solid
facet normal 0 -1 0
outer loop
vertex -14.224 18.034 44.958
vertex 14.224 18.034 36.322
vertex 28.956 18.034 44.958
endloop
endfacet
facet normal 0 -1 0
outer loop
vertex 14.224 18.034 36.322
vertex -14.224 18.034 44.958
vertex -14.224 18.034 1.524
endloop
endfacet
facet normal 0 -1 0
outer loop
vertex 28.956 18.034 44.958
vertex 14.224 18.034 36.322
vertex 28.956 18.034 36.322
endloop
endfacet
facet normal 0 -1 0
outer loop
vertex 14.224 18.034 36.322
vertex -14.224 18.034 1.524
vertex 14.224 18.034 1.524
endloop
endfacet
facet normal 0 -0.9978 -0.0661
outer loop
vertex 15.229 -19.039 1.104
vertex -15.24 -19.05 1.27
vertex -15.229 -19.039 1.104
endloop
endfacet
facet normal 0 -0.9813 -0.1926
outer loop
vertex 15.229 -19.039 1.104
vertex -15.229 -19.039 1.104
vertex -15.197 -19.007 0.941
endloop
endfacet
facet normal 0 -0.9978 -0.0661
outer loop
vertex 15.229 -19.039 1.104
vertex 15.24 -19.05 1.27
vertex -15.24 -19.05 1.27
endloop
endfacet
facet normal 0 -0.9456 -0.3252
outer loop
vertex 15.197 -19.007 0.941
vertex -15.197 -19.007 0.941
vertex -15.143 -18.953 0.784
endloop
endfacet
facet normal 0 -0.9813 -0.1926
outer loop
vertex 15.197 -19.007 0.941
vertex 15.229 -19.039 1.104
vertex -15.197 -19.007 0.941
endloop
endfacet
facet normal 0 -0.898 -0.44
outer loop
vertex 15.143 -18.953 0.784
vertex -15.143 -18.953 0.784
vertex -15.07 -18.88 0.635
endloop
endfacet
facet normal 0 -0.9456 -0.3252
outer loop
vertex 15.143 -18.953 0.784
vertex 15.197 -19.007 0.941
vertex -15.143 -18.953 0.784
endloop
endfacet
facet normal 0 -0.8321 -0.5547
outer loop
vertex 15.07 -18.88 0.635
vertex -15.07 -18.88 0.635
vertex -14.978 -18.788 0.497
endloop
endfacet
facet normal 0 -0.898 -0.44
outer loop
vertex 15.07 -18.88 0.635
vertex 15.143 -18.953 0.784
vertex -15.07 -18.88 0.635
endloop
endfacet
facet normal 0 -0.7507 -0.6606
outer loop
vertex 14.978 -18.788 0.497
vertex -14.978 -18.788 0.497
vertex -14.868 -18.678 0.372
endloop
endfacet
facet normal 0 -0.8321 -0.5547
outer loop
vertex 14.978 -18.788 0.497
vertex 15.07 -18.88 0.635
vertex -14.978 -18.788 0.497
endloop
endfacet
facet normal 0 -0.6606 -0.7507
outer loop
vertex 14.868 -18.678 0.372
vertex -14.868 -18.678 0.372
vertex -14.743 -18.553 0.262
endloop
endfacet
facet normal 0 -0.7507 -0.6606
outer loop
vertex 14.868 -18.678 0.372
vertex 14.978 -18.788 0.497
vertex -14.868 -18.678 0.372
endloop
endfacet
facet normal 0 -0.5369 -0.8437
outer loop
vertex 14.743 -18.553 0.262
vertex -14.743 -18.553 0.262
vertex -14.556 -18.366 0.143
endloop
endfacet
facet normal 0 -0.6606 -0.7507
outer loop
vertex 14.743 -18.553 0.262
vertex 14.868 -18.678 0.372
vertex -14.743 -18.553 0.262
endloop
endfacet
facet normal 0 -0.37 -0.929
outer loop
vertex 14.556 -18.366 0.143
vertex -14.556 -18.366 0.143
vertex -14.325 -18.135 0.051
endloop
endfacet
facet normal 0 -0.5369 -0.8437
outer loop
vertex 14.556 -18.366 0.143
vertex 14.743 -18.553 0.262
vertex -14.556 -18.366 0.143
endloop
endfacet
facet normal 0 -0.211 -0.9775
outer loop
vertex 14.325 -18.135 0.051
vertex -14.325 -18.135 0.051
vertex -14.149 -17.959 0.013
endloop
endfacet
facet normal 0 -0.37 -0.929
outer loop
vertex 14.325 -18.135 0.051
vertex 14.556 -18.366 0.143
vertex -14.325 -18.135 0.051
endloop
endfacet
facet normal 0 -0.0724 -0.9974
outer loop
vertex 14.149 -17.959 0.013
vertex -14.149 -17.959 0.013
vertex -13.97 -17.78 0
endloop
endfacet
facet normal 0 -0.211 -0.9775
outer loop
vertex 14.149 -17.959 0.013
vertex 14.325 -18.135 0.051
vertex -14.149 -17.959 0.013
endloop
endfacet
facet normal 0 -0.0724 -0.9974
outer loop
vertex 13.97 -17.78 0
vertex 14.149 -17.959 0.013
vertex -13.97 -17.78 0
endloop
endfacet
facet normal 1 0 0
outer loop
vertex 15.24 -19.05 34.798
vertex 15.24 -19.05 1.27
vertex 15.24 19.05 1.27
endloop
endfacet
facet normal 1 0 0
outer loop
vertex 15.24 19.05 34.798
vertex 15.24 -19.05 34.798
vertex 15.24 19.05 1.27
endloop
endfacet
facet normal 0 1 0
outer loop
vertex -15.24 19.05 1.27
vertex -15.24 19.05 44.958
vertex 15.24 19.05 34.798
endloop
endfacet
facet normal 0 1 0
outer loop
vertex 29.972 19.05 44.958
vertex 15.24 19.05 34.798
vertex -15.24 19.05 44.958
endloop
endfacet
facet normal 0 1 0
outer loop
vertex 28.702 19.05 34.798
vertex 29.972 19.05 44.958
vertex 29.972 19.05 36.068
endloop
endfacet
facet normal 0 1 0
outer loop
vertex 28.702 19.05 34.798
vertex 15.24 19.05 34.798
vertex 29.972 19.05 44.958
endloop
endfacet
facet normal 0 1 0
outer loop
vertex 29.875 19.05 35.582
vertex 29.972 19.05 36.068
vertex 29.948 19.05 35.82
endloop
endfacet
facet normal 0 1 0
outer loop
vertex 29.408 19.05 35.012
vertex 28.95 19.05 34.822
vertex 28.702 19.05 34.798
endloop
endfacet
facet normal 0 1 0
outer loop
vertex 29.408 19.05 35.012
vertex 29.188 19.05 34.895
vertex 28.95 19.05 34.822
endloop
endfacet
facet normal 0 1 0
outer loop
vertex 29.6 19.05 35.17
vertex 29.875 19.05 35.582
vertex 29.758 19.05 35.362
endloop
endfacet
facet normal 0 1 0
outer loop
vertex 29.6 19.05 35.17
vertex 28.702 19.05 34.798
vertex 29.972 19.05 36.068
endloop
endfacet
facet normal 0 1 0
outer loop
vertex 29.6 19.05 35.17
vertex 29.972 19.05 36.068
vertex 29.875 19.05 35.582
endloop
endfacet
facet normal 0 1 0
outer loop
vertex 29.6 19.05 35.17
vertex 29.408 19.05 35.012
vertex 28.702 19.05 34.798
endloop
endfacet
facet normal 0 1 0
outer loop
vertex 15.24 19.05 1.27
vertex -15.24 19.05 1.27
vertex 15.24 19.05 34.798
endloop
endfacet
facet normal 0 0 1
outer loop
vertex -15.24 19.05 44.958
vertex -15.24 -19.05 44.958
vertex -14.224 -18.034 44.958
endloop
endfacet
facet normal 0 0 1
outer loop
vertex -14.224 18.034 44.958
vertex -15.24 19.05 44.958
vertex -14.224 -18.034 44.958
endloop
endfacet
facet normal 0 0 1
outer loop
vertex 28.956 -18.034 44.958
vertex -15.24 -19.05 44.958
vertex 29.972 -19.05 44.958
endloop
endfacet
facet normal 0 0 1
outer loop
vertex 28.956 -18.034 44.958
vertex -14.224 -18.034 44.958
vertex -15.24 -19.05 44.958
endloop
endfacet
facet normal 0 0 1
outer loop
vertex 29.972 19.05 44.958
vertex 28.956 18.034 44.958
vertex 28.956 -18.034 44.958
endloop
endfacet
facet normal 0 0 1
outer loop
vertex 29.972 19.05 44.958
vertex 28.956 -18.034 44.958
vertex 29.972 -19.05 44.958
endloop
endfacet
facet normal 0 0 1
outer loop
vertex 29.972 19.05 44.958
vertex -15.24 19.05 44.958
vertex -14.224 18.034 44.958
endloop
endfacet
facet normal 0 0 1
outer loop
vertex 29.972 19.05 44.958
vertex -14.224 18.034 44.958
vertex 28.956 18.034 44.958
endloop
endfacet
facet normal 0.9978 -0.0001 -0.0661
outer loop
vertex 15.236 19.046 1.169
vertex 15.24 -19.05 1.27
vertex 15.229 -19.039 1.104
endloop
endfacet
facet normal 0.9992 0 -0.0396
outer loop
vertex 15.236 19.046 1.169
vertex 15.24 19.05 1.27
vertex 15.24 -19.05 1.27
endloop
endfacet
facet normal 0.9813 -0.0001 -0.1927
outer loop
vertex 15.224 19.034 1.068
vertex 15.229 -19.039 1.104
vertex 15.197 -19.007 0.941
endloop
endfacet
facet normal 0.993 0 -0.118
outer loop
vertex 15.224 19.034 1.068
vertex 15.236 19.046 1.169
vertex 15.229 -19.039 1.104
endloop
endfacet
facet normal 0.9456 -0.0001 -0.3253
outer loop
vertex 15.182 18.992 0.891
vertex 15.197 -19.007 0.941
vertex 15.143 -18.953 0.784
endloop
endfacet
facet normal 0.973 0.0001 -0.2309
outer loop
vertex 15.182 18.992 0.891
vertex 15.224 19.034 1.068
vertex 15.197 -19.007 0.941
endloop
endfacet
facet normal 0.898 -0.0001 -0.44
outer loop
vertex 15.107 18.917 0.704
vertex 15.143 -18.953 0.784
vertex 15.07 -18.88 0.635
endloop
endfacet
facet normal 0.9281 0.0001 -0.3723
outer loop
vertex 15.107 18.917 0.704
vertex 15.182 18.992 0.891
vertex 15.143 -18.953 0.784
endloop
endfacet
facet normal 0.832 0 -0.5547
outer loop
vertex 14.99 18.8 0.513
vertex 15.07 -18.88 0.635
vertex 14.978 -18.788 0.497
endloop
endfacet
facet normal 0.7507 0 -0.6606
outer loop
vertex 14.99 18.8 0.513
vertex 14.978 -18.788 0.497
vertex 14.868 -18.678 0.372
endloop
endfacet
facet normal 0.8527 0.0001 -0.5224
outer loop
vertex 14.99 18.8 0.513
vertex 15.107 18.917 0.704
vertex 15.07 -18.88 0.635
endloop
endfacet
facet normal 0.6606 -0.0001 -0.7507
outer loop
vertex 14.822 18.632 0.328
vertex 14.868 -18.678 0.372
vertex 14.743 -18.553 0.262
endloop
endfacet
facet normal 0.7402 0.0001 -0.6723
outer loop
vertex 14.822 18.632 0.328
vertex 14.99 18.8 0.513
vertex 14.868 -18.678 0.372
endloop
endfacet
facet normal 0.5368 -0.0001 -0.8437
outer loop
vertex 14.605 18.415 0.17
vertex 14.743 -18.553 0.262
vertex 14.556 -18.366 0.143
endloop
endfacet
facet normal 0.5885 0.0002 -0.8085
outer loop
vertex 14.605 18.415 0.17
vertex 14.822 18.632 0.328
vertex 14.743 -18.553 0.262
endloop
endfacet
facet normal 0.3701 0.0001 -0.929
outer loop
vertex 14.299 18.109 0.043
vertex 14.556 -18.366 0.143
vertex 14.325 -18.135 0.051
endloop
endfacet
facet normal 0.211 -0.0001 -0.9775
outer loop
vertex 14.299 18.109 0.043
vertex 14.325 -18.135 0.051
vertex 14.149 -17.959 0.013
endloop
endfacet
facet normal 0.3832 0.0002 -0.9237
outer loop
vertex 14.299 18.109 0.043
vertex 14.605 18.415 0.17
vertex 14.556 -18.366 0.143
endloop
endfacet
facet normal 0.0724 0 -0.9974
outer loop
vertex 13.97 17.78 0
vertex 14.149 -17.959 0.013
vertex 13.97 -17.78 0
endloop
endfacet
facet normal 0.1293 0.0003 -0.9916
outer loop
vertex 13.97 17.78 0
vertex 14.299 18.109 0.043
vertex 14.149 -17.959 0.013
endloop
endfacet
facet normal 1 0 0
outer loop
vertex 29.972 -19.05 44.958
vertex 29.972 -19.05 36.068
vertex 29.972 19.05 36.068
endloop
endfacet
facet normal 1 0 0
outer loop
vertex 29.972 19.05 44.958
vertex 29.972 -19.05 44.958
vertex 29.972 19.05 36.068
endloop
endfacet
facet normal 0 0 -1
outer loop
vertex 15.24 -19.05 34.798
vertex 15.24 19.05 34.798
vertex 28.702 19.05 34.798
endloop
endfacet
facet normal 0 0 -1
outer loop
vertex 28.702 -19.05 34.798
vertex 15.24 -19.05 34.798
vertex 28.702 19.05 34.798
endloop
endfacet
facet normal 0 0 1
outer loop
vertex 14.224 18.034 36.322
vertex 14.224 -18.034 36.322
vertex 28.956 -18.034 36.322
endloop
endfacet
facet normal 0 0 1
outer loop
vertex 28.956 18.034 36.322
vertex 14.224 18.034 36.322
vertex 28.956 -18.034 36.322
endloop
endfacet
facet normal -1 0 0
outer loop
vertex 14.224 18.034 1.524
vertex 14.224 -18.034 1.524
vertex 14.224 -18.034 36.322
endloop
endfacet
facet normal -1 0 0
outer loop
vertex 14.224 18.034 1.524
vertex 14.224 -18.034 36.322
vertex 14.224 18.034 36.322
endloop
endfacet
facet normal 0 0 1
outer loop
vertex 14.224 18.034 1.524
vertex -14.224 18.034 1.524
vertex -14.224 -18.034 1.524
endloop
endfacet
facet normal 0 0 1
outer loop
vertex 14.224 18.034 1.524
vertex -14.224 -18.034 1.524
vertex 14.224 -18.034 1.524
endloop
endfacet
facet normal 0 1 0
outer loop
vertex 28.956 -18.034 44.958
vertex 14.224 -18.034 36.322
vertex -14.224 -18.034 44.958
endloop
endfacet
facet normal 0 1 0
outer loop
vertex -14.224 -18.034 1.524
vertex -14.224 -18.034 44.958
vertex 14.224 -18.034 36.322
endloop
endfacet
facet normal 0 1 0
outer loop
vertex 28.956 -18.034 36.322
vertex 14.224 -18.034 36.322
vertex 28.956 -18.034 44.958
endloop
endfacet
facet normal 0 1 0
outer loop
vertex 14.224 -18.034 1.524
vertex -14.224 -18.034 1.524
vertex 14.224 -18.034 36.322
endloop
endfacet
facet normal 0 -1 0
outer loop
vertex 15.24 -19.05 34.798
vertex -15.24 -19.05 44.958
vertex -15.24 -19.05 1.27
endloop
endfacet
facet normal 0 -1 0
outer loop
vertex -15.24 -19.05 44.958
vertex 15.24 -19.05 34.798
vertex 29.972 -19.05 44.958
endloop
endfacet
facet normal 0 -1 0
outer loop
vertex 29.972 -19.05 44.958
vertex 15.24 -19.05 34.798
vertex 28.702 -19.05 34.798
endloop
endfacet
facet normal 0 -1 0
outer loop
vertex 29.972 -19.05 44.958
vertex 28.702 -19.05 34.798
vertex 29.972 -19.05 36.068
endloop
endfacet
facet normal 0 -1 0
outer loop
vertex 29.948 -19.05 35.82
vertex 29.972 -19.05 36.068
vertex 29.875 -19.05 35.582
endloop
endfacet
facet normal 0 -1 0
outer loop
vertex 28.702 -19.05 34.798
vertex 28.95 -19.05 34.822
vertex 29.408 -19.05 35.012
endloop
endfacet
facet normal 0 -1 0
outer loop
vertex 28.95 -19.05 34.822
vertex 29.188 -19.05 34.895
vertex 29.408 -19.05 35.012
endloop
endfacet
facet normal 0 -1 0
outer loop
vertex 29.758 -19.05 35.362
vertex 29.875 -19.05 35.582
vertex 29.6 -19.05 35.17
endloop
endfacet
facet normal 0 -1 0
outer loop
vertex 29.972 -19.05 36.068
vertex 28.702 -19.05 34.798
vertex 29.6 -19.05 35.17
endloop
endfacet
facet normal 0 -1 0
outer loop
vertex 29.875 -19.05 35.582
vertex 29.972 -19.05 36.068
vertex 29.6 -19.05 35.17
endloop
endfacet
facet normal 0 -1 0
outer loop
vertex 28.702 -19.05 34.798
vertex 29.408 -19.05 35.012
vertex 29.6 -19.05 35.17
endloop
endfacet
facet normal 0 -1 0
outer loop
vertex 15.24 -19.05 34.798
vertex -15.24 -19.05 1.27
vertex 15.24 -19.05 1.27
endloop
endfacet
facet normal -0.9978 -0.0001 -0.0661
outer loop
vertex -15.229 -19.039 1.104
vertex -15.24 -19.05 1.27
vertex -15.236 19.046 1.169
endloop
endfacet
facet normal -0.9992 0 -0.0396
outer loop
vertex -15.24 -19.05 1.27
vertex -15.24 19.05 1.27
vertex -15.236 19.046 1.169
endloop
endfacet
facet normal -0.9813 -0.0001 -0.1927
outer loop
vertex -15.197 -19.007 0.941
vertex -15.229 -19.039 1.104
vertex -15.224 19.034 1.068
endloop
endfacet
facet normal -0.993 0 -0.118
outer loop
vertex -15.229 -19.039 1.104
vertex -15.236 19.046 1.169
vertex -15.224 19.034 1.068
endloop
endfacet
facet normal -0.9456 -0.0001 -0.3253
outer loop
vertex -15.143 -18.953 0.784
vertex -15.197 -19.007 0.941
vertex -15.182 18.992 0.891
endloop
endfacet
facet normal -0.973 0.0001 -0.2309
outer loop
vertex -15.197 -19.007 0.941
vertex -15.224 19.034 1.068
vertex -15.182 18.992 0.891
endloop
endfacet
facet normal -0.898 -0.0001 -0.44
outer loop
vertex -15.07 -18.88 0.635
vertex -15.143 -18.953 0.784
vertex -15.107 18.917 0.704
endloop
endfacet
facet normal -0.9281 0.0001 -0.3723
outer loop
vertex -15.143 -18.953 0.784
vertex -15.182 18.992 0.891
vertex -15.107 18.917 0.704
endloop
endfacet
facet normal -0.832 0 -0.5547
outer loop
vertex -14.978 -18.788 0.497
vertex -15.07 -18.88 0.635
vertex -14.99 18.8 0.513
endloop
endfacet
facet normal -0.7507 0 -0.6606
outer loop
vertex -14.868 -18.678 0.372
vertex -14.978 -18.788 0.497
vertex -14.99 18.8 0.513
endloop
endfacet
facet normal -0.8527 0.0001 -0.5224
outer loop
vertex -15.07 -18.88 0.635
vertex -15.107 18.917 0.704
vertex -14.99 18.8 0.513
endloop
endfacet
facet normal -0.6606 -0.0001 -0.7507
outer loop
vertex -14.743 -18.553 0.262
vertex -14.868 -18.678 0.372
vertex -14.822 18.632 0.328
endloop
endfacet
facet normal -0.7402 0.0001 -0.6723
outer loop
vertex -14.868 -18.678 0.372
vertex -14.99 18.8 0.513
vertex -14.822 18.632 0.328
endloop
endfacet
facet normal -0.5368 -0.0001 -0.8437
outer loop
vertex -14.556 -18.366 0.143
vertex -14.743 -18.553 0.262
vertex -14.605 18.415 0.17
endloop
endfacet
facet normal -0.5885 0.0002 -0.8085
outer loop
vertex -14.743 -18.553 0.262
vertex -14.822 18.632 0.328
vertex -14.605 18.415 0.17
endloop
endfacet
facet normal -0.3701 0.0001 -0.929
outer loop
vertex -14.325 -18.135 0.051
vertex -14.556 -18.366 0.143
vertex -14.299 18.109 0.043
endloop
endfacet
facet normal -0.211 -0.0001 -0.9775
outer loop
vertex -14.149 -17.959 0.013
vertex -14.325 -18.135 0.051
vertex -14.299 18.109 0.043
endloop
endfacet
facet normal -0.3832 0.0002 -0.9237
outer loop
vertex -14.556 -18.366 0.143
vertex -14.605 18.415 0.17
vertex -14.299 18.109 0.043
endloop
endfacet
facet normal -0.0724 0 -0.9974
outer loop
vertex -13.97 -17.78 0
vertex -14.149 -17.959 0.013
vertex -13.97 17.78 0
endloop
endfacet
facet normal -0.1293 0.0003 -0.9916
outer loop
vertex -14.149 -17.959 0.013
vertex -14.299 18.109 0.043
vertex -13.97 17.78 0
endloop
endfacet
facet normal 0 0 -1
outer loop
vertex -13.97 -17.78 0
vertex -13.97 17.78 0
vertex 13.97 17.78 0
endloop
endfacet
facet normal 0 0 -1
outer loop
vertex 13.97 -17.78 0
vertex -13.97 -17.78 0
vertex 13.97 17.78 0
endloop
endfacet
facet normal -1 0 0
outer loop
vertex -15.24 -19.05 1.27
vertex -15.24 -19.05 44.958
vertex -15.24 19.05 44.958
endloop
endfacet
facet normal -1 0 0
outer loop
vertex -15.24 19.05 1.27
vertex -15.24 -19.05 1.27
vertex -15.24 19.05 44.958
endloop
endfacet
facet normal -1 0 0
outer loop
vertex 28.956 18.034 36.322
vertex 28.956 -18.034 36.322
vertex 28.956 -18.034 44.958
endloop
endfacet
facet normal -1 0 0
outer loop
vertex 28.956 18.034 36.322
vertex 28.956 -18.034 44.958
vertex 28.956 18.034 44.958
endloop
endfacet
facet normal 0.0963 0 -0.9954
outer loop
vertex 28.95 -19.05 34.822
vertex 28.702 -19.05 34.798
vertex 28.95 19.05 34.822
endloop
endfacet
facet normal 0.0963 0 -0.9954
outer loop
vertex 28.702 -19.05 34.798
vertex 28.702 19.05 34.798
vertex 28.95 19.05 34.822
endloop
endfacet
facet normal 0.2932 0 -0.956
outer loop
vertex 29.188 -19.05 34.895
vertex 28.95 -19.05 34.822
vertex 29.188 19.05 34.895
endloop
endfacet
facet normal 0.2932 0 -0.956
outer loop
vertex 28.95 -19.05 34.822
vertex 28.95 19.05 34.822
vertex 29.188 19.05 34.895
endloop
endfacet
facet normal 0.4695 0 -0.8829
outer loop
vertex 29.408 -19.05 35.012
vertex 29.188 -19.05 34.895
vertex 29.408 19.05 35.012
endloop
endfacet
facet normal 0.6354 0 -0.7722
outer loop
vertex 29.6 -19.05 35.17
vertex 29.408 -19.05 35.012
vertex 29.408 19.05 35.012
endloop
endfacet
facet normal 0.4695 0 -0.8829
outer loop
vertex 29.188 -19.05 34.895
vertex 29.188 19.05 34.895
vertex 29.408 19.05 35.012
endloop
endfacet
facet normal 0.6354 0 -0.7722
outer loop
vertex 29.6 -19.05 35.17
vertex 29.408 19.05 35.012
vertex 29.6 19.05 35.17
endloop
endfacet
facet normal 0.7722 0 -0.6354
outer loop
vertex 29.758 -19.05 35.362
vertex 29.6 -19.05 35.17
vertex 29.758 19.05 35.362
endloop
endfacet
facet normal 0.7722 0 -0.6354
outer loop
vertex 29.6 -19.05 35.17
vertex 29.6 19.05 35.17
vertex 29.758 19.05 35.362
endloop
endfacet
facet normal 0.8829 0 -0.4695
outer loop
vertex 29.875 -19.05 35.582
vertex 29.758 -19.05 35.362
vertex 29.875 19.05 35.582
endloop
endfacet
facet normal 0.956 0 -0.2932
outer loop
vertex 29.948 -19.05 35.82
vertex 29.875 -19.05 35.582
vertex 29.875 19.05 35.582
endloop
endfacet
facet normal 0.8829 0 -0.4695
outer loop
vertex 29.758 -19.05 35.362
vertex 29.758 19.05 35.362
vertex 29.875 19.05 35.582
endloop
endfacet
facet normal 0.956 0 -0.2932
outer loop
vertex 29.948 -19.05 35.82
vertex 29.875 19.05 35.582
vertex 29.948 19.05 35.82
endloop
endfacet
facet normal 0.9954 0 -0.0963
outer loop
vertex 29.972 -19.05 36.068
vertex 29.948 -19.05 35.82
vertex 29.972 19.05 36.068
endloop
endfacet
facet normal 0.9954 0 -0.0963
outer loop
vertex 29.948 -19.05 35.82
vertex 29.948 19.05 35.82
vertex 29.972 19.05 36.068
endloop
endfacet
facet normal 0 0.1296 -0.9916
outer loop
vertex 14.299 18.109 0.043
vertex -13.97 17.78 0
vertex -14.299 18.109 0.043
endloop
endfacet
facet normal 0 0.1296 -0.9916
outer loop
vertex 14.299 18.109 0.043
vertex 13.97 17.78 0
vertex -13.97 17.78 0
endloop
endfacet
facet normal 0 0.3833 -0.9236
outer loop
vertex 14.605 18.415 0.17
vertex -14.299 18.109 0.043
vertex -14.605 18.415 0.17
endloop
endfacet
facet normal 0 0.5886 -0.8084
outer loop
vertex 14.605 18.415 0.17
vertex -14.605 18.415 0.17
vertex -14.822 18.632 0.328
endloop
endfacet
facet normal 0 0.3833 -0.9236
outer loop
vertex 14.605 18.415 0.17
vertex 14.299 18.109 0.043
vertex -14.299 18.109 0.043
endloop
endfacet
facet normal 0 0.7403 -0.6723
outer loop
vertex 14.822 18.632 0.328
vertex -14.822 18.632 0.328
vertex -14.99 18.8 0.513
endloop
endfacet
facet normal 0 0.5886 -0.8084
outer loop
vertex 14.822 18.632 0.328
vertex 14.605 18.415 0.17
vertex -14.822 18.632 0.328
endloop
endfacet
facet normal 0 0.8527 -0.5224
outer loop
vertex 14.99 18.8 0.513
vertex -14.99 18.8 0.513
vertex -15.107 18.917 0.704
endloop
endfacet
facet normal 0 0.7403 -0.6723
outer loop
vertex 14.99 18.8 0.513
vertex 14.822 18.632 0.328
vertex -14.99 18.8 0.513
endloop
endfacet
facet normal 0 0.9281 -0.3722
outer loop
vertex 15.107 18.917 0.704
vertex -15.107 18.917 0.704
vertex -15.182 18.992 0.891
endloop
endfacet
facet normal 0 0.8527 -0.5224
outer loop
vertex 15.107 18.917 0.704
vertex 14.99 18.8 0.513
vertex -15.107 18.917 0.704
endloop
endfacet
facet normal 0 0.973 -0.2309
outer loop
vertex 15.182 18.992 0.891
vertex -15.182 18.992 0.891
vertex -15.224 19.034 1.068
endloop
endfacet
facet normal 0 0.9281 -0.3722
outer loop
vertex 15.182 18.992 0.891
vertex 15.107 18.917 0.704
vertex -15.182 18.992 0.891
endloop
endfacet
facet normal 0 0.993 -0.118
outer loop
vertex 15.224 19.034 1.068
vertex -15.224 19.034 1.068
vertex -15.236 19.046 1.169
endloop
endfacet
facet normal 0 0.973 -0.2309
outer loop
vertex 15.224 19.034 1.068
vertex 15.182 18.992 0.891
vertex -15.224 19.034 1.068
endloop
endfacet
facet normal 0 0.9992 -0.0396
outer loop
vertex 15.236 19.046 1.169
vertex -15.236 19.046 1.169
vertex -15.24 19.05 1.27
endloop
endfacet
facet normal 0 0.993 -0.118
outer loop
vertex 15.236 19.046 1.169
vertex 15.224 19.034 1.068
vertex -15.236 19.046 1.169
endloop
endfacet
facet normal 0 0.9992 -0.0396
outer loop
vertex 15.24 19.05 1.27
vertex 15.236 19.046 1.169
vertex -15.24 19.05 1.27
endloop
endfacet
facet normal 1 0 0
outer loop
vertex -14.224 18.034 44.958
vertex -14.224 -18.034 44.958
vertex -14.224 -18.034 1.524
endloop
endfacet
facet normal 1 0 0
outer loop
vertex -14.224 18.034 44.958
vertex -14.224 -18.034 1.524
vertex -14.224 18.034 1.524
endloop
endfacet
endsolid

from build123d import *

# Parameters (mm, degrees)
F0_W     = 30.48
F0_H     = 38.1
F1_DEPTH = 1.524
F2_W     = 30.48
F2_H     = 38.1
F2_W_2   = 28.448
F2_H_2   = 36.068
F3_DEPTH = 33.274
F4_R     = 1.27
F5_W     = 45.212
F5_H     = 38.1
F5_W_2   = 28.448
F5_H_2   = 36.068
F6_DEPTH = 1.524
F7_W     = 45.212
F7_H     = 38.1
F7_W_2   = 43.18
F7_H_2   = 36.068
F8_DEPTH = 8.636
F9_R     = 1.27


with BuildPart() as f1:
    # F0 (on Top) → F1 (new body)
    with BuildSketch(Plane.XY):
        Rectangle(F0_W, F0_H)
    extrude(amount=F1_DEPTH)

    # F2 (on face) → F3 (join)
    with BuildSketch(Plane.XY.offset(1.524)):
        Rectangle(F2_W, F2_H)
        Rectangle(F2_W_2, F2_H_2, mode=Mode.SUBTRACT)
    extrude(amount=F3_DEPTH)

    # F4
    f4_edges = [f1.edges().sort_by_distance(p)[0] for p in [
        (0, 19.05, 0),
        (-15.24, 0, 0),
        (0, -19.05, 0),
        (15.24, 0, 0),
    ]]
    fillet(f4_edges, radius=F4_R)

    # F5 (on face) → F6 (join)
    with BuildSketch(Plane.XY.offset(34.798)):
        with Locations((7.366, 0)):
            Rectangle(F5_W, F5_H)
        Rectangle(F5_W_2, F5_H_2, mode=Mode.SUBTRACT)
    extrude(amount=F6_DEPTH)

    # F7 (on face) → F8 (join)
    with BuildSketch(Plane.XY.offset(36.322)):
        with Locations((7.366, 0)):
            Rectangle(F7_W, F7_H)
        with Locations((7.366, 0)):
            Rectangle(F7_W_2, F7_H_2, mode=Mode.SUBTRACT)
    extrude(amount=F8_DEPTH)

    # F9
    f9_edges = [f1.edges().sort_by_distance(p)[0] for p in [
        (29.972, 0, 34.798),
    ]]
    fillet(f9_edges, radius=F9_R)


solid = f1.part
